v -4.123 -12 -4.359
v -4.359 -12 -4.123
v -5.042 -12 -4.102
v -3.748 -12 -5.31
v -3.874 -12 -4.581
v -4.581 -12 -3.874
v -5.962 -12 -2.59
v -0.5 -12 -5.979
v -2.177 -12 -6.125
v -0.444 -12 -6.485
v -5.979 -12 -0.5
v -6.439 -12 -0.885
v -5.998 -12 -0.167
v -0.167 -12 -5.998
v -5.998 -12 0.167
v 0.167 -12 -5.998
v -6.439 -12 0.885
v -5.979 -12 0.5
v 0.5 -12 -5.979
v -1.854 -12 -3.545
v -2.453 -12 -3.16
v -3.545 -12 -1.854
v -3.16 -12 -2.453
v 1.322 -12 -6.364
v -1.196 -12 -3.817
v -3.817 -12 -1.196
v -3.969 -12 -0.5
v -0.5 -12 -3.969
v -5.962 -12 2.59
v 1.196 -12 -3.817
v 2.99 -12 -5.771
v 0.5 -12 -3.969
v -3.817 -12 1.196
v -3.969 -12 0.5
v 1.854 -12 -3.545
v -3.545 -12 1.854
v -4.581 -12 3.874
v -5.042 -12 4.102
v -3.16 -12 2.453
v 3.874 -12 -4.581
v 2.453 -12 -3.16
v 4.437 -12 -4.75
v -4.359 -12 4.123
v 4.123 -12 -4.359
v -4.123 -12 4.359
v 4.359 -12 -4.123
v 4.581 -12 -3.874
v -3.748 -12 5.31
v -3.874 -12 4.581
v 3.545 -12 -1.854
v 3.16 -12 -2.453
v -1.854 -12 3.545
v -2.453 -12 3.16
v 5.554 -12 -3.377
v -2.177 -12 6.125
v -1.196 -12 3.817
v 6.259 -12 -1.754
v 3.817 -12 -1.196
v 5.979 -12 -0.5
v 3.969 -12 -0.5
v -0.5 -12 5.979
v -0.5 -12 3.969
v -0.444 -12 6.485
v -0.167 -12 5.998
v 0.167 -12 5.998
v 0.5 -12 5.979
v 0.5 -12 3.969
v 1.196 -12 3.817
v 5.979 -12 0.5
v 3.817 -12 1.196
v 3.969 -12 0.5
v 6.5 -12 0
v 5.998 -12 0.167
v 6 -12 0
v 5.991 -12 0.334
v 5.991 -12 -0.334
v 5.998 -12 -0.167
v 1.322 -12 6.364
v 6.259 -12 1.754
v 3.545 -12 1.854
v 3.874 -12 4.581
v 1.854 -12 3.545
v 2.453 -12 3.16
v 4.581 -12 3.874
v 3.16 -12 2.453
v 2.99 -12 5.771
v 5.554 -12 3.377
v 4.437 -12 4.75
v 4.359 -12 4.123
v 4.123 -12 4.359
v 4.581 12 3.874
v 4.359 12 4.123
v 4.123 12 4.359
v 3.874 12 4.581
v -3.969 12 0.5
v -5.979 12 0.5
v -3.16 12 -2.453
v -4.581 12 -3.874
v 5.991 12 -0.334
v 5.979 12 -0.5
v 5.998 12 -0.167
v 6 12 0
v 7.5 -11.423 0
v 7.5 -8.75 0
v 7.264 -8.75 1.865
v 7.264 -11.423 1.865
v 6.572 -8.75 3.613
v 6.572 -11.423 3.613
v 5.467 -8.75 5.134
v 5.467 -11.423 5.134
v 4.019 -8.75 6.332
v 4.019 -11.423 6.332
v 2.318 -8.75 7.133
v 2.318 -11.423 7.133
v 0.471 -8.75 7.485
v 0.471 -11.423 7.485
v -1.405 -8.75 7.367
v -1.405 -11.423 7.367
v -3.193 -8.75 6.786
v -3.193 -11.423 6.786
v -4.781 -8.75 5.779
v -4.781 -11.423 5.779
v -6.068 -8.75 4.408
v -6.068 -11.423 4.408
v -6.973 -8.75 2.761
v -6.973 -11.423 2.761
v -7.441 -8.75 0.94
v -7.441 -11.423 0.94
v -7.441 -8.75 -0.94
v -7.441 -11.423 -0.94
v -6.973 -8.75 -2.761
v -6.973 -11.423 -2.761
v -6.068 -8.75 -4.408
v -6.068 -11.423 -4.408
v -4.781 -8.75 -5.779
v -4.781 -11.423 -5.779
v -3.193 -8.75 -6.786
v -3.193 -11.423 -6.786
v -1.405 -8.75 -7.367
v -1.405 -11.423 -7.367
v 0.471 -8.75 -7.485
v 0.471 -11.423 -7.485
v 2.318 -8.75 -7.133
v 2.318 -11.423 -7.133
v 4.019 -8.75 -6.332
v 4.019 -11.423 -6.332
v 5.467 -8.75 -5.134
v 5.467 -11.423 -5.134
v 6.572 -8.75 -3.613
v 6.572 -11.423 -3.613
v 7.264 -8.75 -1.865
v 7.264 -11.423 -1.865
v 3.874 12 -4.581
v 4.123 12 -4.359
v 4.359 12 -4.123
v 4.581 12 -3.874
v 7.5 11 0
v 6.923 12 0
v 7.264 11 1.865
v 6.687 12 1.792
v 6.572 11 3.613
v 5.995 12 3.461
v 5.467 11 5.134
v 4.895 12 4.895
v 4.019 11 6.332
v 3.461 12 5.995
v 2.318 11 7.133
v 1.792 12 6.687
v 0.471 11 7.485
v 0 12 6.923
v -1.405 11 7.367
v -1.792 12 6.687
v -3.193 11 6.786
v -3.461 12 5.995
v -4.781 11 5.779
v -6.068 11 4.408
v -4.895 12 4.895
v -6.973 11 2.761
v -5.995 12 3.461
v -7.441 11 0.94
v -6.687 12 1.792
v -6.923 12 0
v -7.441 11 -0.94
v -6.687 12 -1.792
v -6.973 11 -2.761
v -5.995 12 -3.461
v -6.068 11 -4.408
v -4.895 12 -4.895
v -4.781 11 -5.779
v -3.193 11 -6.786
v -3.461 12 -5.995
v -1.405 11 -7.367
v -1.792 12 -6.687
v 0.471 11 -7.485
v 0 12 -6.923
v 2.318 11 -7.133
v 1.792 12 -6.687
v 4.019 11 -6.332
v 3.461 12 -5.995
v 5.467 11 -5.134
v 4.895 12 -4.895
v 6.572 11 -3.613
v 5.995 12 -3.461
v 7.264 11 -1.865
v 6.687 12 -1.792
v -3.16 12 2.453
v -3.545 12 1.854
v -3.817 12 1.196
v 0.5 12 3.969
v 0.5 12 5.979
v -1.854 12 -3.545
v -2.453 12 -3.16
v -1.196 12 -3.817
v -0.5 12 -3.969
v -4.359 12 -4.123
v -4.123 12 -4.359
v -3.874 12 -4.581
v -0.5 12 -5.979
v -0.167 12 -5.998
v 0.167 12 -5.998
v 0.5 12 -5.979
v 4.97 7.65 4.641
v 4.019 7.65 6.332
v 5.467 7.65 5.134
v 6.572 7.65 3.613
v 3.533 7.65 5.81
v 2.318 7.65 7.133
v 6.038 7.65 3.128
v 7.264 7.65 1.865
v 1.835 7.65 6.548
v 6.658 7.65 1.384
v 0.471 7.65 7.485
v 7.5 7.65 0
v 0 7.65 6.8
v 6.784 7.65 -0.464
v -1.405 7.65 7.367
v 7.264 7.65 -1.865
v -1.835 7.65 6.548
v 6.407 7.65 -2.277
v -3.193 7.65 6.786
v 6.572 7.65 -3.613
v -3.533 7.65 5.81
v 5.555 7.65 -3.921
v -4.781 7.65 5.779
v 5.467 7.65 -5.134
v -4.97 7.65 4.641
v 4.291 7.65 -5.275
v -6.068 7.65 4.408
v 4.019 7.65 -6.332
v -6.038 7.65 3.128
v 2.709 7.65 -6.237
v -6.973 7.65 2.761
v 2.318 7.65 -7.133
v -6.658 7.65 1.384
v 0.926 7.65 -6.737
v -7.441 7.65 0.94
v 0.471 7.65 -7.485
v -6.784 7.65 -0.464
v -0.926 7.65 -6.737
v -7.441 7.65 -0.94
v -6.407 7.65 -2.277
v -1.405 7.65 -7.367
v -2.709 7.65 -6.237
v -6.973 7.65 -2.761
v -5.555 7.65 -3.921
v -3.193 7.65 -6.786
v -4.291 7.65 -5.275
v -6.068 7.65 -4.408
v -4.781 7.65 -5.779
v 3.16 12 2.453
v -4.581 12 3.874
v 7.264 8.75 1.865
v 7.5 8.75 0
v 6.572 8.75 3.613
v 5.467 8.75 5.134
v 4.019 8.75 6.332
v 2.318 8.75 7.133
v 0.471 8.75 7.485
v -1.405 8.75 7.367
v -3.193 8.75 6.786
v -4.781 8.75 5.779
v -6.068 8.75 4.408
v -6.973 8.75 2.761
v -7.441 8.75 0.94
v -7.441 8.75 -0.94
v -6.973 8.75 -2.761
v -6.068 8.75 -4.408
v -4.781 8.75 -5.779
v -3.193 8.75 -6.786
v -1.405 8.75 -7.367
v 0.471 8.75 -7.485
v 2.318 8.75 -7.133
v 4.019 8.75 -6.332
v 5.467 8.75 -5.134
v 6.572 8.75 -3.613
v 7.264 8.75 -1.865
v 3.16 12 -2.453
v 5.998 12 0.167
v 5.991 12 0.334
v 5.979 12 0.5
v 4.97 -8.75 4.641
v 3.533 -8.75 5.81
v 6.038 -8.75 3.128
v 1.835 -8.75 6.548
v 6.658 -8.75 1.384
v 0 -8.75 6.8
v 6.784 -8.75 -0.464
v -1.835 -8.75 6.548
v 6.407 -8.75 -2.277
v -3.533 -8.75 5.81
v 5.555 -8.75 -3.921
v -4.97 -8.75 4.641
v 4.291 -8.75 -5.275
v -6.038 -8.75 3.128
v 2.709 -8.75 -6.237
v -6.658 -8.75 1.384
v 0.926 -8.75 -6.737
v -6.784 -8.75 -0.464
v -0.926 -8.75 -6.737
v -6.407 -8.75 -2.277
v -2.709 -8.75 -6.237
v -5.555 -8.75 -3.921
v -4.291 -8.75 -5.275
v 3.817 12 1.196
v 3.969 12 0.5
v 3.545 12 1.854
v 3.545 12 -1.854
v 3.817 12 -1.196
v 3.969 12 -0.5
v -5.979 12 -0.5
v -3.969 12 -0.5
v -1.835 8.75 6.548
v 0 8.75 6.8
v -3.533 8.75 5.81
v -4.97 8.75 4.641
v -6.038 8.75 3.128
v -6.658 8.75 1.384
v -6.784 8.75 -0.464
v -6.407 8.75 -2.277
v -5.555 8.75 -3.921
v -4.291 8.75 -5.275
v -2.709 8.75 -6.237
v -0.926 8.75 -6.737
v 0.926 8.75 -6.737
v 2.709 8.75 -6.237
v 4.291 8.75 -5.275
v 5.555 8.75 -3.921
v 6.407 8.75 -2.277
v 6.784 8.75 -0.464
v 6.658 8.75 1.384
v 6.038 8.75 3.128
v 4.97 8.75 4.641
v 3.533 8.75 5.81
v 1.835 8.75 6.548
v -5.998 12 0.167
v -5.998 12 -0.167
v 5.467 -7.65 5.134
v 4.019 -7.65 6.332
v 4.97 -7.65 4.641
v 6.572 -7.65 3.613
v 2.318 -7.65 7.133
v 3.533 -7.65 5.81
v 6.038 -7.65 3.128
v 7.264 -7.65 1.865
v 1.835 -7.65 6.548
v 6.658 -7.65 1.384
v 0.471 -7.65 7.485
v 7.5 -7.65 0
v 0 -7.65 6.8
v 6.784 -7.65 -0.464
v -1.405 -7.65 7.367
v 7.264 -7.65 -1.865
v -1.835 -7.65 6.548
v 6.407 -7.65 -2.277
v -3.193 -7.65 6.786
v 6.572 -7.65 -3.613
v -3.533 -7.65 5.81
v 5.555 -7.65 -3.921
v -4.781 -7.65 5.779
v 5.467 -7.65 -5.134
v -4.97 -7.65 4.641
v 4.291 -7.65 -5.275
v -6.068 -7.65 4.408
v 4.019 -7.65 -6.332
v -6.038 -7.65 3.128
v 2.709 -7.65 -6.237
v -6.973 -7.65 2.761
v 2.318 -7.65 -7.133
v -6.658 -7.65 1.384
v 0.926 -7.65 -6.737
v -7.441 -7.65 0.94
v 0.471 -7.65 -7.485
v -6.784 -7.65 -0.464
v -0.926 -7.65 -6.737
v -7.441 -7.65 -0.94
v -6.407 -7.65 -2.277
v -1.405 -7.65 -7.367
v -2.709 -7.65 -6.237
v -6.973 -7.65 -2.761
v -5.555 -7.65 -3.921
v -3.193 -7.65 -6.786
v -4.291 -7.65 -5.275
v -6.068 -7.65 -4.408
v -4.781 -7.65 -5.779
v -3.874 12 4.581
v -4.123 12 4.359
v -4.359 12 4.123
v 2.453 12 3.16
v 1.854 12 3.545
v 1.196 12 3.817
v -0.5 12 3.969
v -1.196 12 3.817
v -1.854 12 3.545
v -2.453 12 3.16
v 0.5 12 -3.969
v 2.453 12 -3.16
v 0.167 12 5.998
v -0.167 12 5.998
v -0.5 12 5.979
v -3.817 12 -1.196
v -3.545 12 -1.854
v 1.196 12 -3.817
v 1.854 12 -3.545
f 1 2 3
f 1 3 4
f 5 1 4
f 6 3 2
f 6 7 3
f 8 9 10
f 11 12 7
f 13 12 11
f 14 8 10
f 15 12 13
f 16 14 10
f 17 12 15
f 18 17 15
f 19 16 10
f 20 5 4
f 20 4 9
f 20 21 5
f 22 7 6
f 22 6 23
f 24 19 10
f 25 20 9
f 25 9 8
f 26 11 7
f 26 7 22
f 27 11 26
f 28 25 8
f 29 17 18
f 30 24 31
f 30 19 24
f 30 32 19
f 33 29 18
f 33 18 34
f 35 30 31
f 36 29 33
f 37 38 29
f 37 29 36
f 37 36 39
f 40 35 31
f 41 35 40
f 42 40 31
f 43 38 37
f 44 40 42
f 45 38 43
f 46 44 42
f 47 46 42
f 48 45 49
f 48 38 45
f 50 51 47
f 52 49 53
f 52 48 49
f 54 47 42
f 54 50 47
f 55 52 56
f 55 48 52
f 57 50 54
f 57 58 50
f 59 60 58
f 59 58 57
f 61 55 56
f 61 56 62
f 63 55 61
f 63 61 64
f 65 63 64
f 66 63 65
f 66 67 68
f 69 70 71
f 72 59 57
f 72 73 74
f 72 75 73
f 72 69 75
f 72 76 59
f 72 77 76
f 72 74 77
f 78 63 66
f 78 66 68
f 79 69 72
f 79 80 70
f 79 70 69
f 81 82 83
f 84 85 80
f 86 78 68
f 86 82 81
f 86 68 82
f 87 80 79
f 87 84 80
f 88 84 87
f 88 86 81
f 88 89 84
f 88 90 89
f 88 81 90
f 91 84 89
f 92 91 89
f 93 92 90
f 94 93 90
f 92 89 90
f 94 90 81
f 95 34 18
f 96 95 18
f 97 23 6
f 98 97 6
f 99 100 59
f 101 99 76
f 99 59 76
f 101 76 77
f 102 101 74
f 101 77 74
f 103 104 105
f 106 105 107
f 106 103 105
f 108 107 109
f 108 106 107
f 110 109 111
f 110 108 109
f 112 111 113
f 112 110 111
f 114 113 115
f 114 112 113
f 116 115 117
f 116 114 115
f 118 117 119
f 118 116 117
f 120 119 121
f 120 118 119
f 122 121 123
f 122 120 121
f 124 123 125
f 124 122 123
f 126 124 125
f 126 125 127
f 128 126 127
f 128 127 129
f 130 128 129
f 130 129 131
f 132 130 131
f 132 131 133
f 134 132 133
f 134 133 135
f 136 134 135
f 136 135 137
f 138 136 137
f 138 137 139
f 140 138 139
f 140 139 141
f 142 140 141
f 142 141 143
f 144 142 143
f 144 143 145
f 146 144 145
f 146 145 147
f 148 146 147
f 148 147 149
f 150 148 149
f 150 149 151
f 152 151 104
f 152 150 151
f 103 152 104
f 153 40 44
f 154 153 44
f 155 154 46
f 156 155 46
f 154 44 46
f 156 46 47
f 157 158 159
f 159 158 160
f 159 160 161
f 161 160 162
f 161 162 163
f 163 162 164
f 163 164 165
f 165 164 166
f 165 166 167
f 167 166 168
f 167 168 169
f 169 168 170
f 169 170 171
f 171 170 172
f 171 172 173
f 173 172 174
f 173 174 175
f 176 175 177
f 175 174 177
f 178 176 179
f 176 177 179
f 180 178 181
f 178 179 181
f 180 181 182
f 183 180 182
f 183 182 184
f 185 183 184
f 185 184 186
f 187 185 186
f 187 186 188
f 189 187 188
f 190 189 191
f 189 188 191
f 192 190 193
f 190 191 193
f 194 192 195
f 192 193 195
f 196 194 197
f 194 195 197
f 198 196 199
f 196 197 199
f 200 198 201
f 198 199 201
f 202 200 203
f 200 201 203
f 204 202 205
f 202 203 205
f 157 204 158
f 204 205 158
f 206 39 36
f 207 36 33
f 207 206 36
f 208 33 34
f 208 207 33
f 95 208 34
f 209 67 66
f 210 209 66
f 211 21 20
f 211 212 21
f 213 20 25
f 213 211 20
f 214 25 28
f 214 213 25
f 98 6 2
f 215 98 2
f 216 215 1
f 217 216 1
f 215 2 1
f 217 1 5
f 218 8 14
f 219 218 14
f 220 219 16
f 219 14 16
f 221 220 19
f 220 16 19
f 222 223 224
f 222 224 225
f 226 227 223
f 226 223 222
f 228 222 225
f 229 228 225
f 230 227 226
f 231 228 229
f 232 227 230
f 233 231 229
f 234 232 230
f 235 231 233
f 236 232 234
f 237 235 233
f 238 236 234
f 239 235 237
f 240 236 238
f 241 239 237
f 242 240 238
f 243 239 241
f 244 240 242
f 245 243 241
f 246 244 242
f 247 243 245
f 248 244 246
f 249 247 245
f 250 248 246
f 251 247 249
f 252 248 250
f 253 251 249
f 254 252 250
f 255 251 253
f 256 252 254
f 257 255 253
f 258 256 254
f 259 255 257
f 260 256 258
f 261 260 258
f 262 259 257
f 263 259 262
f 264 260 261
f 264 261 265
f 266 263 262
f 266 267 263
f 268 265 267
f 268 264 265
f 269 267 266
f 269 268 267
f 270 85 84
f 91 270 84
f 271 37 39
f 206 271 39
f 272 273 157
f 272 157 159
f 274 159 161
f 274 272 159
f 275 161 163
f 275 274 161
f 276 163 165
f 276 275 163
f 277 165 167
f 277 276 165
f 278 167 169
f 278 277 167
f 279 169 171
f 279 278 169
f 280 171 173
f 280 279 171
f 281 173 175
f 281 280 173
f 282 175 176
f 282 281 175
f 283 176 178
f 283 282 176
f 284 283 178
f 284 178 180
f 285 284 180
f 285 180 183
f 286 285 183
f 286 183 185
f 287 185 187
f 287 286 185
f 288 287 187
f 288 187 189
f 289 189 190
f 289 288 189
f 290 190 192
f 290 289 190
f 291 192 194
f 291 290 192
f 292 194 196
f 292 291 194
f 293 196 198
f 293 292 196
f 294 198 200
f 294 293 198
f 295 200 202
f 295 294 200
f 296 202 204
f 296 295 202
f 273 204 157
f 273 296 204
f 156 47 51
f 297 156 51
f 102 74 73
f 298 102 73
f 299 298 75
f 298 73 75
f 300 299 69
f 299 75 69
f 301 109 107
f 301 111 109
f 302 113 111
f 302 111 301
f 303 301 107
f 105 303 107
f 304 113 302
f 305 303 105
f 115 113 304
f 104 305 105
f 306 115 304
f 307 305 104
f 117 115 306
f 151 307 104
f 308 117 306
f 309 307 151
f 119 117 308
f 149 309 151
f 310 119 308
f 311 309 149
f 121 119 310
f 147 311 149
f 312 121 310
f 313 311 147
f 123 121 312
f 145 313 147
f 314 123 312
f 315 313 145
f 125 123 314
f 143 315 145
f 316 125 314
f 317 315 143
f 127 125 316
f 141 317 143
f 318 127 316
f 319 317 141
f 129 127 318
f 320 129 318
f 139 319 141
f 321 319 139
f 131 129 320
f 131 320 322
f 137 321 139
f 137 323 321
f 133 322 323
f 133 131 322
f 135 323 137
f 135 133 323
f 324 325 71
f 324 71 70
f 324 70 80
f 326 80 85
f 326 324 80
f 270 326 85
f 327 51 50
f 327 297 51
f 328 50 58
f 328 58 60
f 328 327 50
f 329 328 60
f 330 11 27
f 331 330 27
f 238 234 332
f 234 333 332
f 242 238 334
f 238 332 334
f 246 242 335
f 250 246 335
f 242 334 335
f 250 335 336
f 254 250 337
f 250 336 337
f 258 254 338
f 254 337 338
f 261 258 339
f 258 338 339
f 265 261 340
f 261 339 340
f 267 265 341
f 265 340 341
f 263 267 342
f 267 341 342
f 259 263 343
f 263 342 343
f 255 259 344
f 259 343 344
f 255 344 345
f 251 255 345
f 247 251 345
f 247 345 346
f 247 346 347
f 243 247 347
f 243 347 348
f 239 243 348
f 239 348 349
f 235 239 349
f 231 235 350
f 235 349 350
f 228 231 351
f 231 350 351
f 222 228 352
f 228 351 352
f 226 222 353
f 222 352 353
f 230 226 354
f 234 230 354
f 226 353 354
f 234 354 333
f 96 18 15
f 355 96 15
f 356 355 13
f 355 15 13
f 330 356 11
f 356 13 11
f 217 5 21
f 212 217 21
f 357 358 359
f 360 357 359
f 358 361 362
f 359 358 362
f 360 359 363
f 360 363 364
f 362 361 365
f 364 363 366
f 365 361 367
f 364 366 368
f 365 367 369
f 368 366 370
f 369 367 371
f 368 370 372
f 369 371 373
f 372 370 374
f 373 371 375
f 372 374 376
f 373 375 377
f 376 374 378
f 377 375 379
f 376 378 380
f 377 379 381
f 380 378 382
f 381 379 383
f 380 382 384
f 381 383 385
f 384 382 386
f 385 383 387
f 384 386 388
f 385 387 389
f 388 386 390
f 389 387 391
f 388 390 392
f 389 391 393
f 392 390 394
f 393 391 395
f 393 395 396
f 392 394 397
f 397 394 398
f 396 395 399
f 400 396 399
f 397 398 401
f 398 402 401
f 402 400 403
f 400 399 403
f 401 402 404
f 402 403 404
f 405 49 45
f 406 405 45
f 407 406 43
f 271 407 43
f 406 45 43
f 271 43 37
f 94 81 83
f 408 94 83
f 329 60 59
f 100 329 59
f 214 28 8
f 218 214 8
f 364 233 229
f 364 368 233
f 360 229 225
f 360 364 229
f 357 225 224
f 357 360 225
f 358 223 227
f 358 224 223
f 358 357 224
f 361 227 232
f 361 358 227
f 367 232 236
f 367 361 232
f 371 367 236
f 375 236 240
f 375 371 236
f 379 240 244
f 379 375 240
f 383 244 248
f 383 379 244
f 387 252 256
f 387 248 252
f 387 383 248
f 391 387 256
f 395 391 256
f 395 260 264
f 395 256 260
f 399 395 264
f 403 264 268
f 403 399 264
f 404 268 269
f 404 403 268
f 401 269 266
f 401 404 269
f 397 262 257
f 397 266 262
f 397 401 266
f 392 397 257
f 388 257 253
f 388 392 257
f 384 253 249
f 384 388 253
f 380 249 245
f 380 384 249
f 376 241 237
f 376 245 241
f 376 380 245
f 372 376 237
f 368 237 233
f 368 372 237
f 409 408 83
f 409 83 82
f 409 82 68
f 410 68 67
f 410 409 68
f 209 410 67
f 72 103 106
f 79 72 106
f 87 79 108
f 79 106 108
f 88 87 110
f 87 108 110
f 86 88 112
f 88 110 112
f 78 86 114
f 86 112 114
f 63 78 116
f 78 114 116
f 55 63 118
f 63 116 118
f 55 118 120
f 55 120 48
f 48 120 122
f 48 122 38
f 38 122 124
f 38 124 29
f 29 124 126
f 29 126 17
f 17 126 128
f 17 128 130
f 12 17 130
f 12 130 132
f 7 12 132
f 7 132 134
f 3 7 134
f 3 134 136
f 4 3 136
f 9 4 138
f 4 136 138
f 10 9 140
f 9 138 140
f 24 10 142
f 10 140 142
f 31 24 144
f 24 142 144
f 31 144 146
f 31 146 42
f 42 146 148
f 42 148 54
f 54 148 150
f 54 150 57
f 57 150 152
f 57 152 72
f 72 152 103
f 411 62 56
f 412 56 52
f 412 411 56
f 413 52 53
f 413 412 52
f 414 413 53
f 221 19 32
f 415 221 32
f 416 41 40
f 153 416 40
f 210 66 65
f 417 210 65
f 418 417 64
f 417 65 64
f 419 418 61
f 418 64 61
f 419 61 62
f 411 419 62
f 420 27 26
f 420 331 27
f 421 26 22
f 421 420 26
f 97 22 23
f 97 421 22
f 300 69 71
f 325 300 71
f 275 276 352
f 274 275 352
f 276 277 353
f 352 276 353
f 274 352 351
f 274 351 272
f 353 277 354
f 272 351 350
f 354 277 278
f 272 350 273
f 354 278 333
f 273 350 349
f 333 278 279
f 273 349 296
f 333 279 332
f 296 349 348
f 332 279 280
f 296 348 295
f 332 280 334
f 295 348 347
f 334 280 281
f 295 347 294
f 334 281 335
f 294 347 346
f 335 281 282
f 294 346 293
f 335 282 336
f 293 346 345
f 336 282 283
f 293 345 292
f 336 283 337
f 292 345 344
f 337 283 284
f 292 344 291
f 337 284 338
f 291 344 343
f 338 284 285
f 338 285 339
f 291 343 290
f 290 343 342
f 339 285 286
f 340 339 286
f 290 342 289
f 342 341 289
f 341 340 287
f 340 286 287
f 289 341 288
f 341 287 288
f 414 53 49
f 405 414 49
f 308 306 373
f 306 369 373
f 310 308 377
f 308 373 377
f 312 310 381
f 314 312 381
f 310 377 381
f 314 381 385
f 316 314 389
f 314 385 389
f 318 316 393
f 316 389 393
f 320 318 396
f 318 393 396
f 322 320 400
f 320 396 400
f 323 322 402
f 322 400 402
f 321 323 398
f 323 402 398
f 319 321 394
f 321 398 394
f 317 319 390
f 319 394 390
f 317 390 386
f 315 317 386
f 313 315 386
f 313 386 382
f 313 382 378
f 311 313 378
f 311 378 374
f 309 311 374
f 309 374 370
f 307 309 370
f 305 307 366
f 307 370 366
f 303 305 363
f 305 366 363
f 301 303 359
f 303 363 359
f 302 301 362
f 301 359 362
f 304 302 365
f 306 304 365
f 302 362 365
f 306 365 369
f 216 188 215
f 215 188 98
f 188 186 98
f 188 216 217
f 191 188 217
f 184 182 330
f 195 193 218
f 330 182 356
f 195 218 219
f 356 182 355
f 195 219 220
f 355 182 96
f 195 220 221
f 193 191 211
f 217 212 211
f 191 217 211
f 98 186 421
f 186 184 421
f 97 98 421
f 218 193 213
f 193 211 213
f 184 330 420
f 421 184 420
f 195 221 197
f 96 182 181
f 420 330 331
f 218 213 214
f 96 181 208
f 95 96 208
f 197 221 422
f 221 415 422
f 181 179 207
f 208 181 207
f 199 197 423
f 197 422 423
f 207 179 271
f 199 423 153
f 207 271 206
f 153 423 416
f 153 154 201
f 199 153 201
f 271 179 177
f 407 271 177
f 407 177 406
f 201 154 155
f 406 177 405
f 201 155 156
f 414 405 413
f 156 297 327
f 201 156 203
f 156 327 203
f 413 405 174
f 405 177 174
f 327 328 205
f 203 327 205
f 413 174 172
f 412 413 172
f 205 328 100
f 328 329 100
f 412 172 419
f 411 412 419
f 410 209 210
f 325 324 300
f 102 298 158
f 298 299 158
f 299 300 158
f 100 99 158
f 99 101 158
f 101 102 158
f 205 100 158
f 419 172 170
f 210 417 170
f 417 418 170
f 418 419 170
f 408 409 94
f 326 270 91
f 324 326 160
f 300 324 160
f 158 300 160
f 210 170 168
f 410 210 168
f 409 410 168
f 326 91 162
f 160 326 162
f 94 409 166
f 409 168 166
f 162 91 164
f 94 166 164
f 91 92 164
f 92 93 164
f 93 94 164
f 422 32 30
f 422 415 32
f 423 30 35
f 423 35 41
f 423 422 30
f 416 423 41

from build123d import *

# Parameters (mm, degrees)
F0_R       = 7.5
F0_R_2     = 4
F1_DEPTH   = 12
F3_DEPTH   = 24.001
F4_W       = 1.1
F4_H       = 0.7
F6_SIZE2   = 0.5773502692
F6_SIZE    = 1
F6_2_SIZE2 = 0.5773502692
F6_2_SIZE  = 1


with BuildPart() as f1:
    # F0 (on Front) → F1 (new body, symmetric)
    with BuildSketch(Plane.XZ):
        Circle(F0_R)
        Circle(F0_R_2, mode=Mode.SUBTRACT)
    extrude(amount=F1_DEPTH, both=True)

    # F2 (on face) → F3 (cut, through all)
    with BuildSketch(Plane.XZ.offset(12)):
        with BuildLine():
            Line((0.5, 3.9686269666), (0.5, 5.9791303716))
            ThreePointArc((0.5, 5.9791303716), (0, 6), (-0.5, 5.9791303716))
            Line((-0.5, 5.9791303716), (-0.5, 3.9686269666))
            ThreePointArc((-0.5, 3.9686269666), (0, 4), (0.5, 3.9686269666))
        make_face()
        with BuildLine():
            Line((3.1597964307, 2.4526896495), (4.5814370219, 3.8743302407))
            ThreePointArc((4.5814370219, 3.8743302407), (4.2426406871, 4.2426406871), (3.8743302407, 4.5814370219))
            Line((3.8743302407, 4.5814370219), (2.4526896495, 3.1597964307))
            ThreePointArc((2.4526896495, 3.1597964307), (2.8284271247, 2.8284271247), (3.1597964307, 2.4526896495))
        make_face()
        with BuildLine():
            ThreePointArc((5.9791303716, -0.5), (5.9947803225, -0.2502176759), (6, 0))
            ThreePointArc((6, 0), (5.9947803225, 0.2502176759), (5.9791303716, 0.5))
            Line((5.9791303716, 0.5), (3.9686269666, 0.5))
            ThreePointArc((3.9686269666, 0.5), (3.9921490369, 0.2504916502), (4, 0))
            ThreePointArc((4, 0), (3.9921490369, -0.2504916502), (3.9686269666, -0.5))
            Line((3.9686269666, -0.5), (5.9791303716, -0.5))
        make_face()
        with BuildLine():
            ThreePointArc((3.8743302407, -4.5814370219), (4.2426406871, -4.2426406871), (4.5814370219, -3.8743302407))
            Line((4.5814370219, -3.8743302407), (3.1597964307, -2.4526896495))
            ThreePointArc((3.1597964307, -2.4526896495), (2.8284271247, -2.8284271247), (2.4526896495, -3.1597964307))
            Line((2.4526896495, -3.1597964307), (3.8743302407, -4.5814370219))
        make_face()
        with BuildLine():
            ThreePointArc((-0.5, -5.9791303716), (0, -6), (0.5, -5.9791303716))
            Line((0.5, -5.9791303716), (0.5, -3.9686269666))
            ThreePointArc((0.5, -3.9686269666), (0, -4), (-0.5, -3.9686269666))
            Line((-0.5, -3.9686269666), (-0.5, -5.9791303716))
        make_face()
        with BuildLine():
            ThreePointArc((-4.5814370219, -3.8743302407), (-4.2426406871, -4.2426406871), (-3.8743302407, -4.5814370219))
            Line((-3.8743302407, -4.5814370219), (-2.4526896495, -3.1597964307))
            ThreePointArc((-2.4526896495, -3.1597964307), (-2.8284271247, -2.8284271247), (-3.1597964307, -2.4526896495))
            Line((-3.1597964307, -2.4526896495), (-4.5814370219, -3.8743302407))
        make_face()
        with BuildLine():
            Line((-3.9686269666, 0.5), (-5.9791303716, 0.5))
            ThreePointArc((-5.9791303716, 0.5), (-6, 0), (-5.9791303716, -0.5))
            Line((-5.9791303716, -0.5), (-3.9686269666, -0.5))
            ThreePointArc((-3.9686269666, -0.5), (-4, 0), (-3.9686269666, 0.5))
        make_face()
        with BuildLine():
            Line((-2.4526896495, 3.1597964307), (-3.8743302407, 4.5814370219))
            ThreePointArc((-3.8743302407, 4.5814370219), (-4.2426406871, 4.2426406871), (-4.5814370219, 3.8743302407))
            Line((-4.5814370219, 3.8743302407), (-3.1597964307, 2.4526896495))
            ThreePointArc((-3.1597964307, 2.4526896495), (-2.8284271247, 2.8284271247), (-2.4526896495, 3.1597964307))
        make_face()
    extrude(amount=-F3_DEPTH, mode=Mode.SUBTRACT)

    # F4 (on Right) → F5 (revolve, cut)
    with BuildSketch(Plane.YZ):
        with Locations((-8.2, 7.15)):
            Rectangle(F4_W, F4_H)
        with Locations((8.2, 7.15)):
            Rectangle(F4_W, F4_H)
    revolve(axis=Axis((0, -12, 0), (0, -1, 0)), mode=Mode.SUBTRACT)

    # F6
    f6_edges = [f1.edges().sort_by_distance(p)[0] for p in [
        (-7.5, -12, 0),
    ]]
    f6_side = f1.faces().sort_by_distance((-7.287868, -12, 0))[0]
    chamfer(f6_edges, length=F6_SIZE, length2=F6_SIZE2, reference=f6_side)

    # F6#2
    f6_2_edges = [f1.edges().sort_by_distance(p)[0] for p in [
        (-7.5, 12, 0),
    ]]
    f6_2_side = f1.faces().sort_by_distance((-7.5, 10.375, 0))[0]
    chamfer(f6_2_edges, length=F6_2_SIZE, length2=F6_2_SIZE2, reference=f6_2_side)


solid = f1.part
